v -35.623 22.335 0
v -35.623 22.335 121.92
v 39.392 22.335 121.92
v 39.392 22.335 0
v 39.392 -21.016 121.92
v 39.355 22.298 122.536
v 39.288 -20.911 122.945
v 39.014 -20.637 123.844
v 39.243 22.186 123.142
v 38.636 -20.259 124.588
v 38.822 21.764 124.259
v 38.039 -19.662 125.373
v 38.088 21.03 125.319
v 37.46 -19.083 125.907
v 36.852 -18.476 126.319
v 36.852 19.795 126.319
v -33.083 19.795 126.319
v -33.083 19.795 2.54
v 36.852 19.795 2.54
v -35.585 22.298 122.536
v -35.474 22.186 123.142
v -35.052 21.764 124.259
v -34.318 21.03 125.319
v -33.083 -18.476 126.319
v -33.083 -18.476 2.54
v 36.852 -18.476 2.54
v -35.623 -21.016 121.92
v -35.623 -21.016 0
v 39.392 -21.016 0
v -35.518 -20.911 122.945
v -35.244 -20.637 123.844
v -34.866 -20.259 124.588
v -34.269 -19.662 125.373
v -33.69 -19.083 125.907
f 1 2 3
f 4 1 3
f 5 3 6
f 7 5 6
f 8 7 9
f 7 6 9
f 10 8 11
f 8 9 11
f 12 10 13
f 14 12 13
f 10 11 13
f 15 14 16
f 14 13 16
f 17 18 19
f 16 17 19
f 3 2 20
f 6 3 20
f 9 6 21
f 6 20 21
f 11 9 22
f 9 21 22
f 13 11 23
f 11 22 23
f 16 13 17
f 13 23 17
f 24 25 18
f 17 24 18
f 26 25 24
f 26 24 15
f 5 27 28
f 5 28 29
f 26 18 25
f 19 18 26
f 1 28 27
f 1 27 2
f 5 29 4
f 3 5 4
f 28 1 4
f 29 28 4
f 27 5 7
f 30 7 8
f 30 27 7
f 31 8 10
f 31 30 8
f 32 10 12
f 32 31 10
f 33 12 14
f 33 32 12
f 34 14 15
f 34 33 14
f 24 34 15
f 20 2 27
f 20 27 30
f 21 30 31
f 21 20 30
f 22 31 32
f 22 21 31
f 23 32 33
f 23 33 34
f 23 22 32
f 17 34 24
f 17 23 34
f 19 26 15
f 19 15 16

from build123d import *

# Parameters (mm, degrees)
F0_W        = 75.0152692199
F0_H        = 43.3505326509
F1_DEPTH    = 127
F2_T        = -2.54
F3_T1_DEPTH = 100.4152692199
F3_T3_DEPTH = 68.7505326509


# Not quite as in the source:
# - a fillet or chamfer that OpenCascade refuses, or shapes differently, is made with other operations: its cross-section is extruded or revolved along the edge and cut away or added


with BuildPart() as f1:
    # F0 (on Top) → F1 (new body)
    with BuildSketch(Plane.XY):
        with Locations((1.8848069012, 0.6596818566)):
            Rectangle(F0_W, F0_H)
    extrude(amount=F1_DEPTH)

    # F2
    f2_openings = [f1.faces().sort_by_distance(p)[0] for p in [
        (1.884807, 0.659682, 127),
    ]]
    offset(amount=F2_T, openings=f2_openings)

    # F3: fillet of radius 5.08 on 4 edges, made by hand

    # F3_s2 → F3_t1 (cut)
    with BuildSketch(Plane.YZ.offset(-48.3228277087)):
        with BuildLine():
            ThreePointArc((22.3349481821, 121.92), (20.8470506305, 125.5121024484), (17.2549481821, 127))
            Line((17.2549481821, 127), (22.3349481821, 127))
            Line((22.3349481821, 127), (22.3349481821, 121.92))
        make_face()
        with BuildLine():
            ThreePointArc((-21.0155844688, 121.92), (-19.5276869173, 125.5121024484), (-15.9355844688, 127))
            Line((-15.9355844688, 127), (-21.0155844688, 127))
            Line((-21.0155844688, 127), (-21.0155844688, 121.92))
        make_face()
    extrude(amount=F3_T1_DEPTH, mode=Mode.SUBTRACT)

    # F3_s4 → F3_t3 (cut)
    with BuildSketch(Plane.XZ.offset(-35.0349481821)):
        with BuildLine():
            ThreePointArc((-35.6228277087, 121.92), (-34.1349301571, 125.5121024484), (-30.5428277087, 127))
            Line((-30.5428277087, 127), (-35.6228277087, 127))
            Line((-35.6228277087, 127), (-35.6228277087, 121.92))
        make_face()
        with BuildLine():
            ThreePointArc((39.3924415112, 121.92), (37.9045439596, 125.5121024484), (34.3124415112, 127))
            Line((34.3124415112, 127), (39.3924415112, 127))
            Line((39.3924415112, 127), (39.3924415112, 121.92))
        make_face()
    extrude(amount=F3_T3_DEPTH, mode=Mode.SUBTRACT)


solid = f1.part
